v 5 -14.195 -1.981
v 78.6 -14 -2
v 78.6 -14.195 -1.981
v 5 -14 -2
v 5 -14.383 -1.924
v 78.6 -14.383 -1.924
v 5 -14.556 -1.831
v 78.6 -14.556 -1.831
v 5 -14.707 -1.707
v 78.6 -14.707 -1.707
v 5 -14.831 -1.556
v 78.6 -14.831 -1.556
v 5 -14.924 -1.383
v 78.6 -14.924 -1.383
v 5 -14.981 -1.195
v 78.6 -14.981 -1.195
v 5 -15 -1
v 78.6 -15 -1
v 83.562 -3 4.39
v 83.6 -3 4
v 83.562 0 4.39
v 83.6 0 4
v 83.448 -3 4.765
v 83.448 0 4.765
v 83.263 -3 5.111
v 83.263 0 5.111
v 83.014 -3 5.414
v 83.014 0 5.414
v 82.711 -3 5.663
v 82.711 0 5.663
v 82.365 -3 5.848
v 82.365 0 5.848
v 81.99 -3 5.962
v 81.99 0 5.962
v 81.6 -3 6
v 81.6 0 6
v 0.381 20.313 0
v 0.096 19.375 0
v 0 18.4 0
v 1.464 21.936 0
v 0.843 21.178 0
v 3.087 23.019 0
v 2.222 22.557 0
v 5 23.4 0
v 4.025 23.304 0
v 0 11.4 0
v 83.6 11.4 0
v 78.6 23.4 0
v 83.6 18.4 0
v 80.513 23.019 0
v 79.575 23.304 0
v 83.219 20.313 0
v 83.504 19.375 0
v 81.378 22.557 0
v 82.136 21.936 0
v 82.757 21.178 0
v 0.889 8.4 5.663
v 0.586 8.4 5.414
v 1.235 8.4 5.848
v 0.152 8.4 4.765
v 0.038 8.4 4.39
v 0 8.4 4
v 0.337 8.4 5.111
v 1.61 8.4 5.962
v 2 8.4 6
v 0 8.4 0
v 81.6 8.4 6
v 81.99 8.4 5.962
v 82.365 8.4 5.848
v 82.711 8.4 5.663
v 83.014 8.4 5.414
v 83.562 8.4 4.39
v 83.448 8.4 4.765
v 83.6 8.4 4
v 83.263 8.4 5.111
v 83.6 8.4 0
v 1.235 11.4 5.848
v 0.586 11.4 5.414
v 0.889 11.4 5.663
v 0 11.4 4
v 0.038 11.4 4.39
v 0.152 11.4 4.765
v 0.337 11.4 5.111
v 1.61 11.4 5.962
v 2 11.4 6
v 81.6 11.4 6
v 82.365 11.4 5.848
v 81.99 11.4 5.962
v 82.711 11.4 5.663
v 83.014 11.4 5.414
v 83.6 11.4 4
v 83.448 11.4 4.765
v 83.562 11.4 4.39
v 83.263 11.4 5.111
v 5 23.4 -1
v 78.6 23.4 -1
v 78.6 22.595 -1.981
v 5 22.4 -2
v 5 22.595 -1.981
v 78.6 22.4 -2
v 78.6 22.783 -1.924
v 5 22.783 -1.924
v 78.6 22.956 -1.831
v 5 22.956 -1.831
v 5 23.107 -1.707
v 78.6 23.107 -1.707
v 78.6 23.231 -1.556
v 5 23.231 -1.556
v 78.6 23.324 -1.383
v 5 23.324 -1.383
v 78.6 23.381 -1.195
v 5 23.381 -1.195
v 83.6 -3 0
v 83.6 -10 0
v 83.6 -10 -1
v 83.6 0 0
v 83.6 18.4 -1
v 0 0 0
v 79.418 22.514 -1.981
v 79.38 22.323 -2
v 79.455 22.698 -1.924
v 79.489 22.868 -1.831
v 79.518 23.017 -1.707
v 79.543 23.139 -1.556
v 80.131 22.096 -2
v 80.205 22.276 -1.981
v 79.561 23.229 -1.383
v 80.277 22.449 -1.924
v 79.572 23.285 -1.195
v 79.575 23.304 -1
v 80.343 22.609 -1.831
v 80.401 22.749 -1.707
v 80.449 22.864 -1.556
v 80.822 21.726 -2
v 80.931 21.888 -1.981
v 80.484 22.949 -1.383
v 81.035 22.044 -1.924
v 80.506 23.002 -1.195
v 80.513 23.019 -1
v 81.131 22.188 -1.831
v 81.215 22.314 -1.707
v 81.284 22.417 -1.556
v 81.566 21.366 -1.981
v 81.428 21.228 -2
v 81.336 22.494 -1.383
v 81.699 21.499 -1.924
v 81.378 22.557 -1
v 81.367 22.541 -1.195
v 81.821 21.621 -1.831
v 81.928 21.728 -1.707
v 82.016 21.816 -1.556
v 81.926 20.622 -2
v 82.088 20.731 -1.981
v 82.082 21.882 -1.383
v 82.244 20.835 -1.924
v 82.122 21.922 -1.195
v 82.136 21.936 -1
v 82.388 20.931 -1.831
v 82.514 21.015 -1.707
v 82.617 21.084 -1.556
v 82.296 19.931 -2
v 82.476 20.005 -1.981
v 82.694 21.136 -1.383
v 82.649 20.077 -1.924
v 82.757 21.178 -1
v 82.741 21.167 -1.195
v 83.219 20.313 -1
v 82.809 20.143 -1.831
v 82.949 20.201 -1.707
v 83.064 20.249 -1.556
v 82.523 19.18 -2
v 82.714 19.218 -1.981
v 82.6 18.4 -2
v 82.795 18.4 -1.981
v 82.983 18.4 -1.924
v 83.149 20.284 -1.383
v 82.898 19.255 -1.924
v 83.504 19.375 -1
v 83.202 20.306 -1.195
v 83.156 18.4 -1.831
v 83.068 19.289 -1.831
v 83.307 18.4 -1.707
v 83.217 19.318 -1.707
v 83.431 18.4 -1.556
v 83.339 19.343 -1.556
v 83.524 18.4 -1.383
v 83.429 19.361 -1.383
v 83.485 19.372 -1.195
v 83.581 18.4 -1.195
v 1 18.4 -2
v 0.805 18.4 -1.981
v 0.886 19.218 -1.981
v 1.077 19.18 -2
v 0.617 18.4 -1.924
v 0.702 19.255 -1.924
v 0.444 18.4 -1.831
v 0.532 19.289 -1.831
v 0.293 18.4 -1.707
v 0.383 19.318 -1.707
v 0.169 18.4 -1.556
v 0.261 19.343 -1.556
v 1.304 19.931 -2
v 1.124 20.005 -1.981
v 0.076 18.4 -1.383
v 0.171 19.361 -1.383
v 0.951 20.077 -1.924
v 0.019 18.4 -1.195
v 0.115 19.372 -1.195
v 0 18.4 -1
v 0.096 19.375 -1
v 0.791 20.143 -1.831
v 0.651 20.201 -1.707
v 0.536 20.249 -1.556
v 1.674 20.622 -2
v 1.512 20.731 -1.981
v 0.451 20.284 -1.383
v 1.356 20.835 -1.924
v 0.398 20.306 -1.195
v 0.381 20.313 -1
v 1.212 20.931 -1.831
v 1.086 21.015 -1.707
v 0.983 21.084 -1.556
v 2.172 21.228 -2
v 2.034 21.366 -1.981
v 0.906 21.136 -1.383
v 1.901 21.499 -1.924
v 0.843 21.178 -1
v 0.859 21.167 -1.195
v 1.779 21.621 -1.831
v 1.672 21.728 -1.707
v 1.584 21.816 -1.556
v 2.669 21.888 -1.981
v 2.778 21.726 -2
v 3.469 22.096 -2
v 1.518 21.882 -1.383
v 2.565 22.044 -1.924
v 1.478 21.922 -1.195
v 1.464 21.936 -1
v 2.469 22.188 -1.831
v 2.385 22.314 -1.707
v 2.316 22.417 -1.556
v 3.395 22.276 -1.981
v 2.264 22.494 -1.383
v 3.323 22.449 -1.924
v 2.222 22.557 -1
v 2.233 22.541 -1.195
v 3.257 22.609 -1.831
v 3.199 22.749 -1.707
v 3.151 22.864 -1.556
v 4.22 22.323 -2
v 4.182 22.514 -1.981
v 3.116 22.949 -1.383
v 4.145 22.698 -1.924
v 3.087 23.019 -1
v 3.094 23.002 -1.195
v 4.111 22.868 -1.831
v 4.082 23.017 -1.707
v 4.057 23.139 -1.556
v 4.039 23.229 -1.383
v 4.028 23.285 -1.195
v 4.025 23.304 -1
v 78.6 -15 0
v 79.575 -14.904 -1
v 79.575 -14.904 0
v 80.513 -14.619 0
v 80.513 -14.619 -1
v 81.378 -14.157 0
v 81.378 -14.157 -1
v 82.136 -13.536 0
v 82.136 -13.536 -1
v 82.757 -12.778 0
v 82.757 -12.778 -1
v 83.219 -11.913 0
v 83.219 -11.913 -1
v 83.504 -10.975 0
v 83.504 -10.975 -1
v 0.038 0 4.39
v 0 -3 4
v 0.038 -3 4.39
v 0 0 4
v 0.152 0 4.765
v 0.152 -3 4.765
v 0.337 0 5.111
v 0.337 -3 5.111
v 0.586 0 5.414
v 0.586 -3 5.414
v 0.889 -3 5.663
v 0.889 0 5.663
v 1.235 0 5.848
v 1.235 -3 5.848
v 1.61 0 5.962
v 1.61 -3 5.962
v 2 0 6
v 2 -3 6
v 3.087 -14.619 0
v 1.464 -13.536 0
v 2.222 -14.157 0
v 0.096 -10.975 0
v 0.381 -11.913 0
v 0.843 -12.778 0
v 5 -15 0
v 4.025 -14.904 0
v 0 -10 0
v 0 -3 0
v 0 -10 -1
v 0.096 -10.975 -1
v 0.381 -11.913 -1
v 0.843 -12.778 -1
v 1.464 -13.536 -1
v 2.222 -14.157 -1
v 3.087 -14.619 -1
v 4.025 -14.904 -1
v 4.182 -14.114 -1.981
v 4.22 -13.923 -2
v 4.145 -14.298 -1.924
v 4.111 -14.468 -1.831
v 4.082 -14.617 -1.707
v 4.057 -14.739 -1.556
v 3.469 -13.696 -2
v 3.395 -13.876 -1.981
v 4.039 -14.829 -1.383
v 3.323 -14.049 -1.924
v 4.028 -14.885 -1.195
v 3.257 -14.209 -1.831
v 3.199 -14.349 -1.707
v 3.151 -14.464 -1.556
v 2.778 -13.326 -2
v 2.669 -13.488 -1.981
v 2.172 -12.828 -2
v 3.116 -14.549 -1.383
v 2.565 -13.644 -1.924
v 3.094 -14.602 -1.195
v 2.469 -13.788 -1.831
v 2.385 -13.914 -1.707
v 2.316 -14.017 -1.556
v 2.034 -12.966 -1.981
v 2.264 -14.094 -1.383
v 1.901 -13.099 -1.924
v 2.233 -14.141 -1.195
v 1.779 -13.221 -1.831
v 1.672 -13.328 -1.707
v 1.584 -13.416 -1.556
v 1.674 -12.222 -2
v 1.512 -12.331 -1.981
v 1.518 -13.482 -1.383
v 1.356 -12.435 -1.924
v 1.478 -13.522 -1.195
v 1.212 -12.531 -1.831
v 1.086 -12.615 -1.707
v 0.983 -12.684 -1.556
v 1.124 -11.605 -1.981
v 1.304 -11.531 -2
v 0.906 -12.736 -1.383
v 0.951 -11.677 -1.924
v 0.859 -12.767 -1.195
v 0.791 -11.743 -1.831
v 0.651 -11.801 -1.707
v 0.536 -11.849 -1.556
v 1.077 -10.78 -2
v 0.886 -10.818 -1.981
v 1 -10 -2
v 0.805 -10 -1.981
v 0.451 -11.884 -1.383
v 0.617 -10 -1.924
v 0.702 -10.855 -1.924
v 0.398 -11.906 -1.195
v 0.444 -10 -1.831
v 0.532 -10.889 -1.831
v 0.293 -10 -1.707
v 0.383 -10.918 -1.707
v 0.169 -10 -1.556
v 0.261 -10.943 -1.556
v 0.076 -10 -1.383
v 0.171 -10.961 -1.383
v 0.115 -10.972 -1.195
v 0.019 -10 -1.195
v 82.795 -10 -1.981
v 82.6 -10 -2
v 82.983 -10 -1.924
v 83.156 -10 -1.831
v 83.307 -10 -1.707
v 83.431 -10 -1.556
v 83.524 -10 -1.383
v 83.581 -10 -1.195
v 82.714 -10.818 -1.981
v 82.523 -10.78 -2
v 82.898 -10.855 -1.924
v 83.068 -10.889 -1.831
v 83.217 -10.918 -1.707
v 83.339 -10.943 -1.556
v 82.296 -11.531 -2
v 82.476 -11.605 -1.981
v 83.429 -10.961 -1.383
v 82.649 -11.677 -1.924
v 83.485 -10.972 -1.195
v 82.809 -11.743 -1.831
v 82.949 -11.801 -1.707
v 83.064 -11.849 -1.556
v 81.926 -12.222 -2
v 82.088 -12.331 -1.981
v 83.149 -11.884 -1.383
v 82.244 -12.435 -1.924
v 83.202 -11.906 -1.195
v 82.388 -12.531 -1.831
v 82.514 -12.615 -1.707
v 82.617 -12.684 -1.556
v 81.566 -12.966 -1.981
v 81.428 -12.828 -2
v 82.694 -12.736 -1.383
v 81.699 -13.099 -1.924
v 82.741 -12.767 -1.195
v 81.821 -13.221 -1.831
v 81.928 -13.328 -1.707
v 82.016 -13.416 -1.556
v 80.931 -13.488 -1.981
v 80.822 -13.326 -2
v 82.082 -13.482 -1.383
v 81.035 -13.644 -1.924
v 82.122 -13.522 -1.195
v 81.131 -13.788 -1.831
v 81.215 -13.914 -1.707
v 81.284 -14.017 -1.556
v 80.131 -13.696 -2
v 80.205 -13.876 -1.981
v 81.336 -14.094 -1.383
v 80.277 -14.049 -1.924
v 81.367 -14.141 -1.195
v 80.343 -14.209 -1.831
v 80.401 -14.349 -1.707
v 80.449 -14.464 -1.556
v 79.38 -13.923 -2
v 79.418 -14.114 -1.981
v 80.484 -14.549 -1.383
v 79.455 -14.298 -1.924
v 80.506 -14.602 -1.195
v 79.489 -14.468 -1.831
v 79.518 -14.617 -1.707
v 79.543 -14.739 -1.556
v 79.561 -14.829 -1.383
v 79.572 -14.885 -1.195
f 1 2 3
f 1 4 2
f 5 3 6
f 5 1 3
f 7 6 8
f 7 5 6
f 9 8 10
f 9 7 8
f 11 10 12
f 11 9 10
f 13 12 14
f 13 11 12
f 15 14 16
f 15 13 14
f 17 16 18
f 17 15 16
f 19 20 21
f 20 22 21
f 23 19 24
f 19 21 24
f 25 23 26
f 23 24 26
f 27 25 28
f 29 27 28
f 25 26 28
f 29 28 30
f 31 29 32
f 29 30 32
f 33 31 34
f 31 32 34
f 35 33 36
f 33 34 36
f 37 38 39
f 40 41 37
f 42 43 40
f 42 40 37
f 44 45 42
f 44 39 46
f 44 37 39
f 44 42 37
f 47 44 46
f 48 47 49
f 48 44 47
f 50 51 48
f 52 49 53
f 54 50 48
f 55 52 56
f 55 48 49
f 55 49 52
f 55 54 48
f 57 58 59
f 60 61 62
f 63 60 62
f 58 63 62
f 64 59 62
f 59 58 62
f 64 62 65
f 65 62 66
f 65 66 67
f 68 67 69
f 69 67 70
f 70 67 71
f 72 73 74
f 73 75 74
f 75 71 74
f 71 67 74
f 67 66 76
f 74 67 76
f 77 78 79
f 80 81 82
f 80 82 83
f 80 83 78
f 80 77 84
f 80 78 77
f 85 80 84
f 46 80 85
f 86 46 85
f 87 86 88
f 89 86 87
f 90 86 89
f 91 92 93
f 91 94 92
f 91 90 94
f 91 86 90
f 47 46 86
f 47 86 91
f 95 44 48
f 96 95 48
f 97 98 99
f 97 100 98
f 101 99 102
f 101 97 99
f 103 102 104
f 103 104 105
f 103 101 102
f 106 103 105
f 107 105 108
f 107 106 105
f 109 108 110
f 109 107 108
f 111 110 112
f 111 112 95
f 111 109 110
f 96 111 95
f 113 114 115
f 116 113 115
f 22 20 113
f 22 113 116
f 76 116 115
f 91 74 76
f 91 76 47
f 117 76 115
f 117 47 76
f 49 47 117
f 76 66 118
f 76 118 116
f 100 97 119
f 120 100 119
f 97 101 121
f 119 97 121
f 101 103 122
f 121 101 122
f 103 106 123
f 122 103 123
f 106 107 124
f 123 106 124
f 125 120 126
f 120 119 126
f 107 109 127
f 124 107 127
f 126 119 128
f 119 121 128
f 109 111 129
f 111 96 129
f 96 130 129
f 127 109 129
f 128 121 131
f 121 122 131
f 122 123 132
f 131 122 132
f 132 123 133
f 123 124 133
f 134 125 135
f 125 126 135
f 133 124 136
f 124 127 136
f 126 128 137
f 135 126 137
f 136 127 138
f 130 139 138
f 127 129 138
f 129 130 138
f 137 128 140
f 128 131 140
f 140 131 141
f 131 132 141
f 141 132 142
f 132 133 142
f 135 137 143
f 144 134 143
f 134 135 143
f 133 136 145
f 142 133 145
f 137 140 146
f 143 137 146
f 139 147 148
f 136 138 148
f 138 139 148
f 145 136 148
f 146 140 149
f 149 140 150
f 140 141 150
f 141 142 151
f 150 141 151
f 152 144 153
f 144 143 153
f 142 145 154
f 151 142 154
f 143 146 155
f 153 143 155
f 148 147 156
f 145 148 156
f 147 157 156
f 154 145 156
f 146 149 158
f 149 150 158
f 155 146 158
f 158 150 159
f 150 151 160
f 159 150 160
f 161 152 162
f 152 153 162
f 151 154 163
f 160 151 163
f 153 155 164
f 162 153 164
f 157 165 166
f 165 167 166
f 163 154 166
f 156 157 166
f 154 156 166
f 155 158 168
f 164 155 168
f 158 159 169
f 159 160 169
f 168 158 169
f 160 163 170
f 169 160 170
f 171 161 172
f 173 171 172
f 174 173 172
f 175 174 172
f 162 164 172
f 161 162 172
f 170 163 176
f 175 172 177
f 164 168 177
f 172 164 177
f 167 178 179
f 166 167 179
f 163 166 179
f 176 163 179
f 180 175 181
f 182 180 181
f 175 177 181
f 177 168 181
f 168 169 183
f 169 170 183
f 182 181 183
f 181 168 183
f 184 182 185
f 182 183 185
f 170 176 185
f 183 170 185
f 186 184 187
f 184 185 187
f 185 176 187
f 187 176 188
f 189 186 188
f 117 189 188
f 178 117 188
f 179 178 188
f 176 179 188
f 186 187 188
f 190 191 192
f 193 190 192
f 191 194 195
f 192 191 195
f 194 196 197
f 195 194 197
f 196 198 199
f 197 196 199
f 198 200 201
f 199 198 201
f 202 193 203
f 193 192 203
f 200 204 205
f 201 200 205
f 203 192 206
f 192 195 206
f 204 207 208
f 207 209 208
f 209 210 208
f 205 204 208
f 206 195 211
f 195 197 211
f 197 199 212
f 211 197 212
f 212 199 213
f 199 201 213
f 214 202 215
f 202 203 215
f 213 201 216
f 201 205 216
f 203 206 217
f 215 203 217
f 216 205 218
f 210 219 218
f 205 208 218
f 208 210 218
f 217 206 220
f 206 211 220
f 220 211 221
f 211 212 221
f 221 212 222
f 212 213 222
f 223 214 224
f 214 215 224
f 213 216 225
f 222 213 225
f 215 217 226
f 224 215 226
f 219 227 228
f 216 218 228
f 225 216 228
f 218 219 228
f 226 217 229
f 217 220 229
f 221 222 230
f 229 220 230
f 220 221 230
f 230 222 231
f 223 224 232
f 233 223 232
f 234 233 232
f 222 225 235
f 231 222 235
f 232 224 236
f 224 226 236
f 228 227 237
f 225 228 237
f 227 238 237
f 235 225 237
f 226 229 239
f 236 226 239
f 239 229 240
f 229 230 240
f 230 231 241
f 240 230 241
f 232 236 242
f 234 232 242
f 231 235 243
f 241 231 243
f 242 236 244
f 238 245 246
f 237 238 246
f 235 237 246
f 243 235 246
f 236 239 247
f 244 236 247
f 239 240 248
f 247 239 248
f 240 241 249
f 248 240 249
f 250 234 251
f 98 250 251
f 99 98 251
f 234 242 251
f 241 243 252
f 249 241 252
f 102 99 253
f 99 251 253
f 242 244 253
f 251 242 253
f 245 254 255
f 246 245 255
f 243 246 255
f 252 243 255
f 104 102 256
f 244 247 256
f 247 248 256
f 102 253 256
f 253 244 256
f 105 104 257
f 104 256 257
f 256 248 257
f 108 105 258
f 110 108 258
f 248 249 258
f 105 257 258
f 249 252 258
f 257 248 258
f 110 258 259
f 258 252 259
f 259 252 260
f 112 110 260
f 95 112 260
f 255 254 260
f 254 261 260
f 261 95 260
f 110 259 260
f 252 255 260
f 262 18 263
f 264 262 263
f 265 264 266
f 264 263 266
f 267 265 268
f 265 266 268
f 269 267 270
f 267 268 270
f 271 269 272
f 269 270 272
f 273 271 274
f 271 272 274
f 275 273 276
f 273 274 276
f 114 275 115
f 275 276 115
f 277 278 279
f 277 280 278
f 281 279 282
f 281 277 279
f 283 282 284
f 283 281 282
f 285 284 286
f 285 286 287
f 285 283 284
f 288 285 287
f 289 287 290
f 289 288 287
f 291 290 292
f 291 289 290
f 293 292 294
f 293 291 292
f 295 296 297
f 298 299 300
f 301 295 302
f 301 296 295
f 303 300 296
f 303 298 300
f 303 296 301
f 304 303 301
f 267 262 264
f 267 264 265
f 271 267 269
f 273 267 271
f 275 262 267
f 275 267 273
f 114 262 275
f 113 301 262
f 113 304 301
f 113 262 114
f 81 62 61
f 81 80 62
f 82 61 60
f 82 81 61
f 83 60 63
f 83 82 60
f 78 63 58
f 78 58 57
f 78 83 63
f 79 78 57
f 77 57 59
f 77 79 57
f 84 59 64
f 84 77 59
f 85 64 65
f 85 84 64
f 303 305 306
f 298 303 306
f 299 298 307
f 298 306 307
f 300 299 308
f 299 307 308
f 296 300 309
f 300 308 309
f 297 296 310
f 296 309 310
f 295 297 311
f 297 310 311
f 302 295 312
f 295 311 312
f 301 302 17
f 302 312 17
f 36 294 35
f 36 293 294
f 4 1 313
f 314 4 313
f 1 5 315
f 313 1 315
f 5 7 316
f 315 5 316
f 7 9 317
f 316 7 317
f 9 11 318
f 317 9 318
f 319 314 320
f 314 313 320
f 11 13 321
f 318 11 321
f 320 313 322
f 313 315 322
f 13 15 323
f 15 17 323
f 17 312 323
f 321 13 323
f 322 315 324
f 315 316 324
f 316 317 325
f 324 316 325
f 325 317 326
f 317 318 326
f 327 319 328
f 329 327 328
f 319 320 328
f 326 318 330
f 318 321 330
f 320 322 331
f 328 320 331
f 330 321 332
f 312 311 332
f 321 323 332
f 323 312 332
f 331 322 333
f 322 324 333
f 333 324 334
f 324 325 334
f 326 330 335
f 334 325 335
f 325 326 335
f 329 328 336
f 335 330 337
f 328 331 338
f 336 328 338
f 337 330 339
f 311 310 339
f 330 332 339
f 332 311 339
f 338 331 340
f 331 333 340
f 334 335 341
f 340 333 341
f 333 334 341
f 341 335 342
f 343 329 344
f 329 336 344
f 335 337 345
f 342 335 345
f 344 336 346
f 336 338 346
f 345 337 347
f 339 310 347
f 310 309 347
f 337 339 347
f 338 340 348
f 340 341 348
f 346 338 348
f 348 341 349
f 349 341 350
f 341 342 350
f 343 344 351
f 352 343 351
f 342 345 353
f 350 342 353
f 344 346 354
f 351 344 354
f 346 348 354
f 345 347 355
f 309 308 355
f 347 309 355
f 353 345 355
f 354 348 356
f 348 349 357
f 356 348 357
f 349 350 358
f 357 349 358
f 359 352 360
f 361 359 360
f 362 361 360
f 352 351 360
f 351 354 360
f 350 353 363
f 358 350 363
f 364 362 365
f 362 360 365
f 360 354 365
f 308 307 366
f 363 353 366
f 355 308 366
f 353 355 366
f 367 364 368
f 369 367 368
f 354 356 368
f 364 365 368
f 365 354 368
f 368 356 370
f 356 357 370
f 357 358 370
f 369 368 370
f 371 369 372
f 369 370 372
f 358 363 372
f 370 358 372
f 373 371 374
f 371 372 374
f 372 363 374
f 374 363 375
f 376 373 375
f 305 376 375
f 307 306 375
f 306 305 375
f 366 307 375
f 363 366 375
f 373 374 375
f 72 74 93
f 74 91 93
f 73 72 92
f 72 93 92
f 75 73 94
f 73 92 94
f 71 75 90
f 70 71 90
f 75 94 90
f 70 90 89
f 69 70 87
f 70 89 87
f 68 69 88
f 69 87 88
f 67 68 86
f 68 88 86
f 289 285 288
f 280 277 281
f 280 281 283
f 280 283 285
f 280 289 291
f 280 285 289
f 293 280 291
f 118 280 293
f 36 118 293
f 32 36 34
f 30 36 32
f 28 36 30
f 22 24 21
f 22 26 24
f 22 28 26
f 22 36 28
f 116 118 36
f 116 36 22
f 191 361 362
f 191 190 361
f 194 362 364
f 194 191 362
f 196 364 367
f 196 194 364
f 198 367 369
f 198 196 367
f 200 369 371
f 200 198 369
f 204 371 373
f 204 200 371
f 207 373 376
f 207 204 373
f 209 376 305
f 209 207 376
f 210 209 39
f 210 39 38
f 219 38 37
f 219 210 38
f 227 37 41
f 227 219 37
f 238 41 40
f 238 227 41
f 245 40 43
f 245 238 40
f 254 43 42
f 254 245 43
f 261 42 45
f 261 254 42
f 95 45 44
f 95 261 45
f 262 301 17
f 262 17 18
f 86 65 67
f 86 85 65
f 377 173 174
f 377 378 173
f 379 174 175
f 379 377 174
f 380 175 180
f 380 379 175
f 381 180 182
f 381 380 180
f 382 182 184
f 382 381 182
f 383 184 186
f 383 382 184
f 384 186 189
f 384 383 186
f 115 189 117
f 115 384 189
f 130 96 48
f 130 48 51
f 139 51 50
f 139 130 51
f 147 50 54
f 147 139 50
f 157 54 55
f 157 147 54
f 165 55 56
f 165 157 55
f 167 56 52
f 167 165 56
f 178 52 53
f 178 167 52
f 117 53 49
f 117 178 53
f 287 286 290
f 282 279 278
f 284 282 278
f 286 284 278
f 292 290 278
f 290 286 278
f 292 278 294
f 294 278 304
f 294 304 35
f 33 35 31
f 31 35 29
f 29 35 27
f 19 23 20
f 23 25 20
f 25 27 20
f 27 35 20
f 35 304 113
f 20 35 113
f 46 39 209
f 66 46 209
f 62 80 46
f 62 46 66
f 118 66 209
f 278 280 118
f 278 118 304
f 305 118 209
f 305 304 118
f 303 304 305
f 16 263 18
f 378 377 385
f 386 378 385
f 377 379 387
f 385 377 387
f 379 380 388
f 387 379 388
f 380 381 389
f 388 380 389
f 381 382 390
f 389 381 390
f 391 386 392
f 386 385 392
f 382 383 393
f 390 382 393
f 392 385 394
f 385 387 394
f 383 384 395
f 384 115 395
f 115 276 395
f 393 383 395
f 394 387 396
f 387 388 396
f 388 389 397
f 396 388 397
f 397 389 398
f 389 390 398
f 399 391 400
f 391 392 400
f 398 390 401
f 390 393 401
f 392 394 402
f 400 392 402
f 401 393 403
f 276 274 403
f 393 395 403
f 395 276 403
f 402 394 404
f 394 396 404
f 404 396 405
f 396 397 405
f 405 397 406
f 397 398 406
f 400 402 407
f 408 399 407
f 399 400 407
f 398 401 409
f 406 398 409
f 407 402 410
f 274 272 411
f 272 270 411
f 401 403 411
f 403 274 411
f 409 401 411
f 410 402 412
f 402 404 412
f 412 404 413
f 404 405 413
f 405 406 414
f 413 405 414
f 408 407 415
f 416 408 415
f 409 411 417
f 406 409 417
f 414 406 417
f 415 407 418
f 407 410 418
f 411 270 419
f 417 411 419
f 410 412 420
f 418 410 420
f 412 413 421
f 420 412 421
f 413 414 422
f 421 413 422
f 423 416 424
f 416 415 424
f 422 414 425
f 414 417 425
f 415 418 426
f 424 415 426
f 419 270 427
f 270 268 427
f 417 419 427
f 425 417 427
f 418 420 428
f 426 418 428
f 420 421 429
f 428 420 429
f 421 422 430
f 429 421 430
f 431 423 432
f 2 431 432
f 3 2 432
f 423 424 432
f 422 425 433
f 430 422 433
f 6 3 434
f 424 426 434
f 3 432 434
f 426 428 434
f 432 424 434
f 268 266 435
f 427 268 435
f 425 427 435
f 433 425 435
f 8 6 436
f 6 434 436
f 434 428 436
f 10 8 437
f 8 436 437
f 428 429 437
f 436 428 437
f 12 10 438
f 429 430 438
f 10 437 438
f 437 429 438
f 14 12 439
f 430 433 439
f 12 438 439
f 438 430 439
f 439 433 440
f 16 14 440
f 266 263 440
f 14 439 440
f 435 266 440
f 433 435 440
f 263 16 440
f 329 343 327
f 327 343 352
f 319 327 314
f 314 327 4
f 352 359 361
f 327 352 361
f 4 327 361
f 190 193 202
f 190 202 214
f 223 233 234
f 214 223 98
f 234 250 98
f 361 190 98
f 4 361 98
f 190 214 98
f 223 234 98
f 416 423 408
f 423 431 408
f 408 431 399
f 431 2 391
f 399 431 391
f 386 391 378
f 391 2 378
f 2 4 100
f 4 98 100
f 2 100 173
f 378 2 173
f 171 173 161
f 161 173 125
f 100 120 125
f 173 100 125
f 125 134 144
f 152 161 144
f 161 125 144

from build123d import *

# Parameters (mm, degrees)
F0_W     = 83.6
F0_H     = 3
F0_H_2   = 8.4
F0_H_3   = 12
F1_DEPTH = 2
F2_DEPTH = 6
F3_R     = 2
F4_R     = 5
F5_R     = 1


with BuildPart() as f1:
    # F0 (on Top) → F1 (new body)
    with BuildSketch(Plane.XY):
        with Locations((41.8, 9.9)):
            Rectangle(F0_W, F0_H)
        with Locations((41.8, -1.5)):
            Rectangle(F0_W, F0_H)
        with Locations((41.8, 4.2)):
            Rectangle(F0_W, F0_H_2)
        with Locations((41.8, 17.4)):
            Rectangle(F0_W, F0_H_3)
        with Locations((41.8, -9)):
            Rectangle(F0_W, F0_H_3)
    extrude(amount=-F1_DEPTH)

    # F0 (on Top) → F2 (join)
    with BuildSketch(Plane.XY):
        with Locations((41.8, 9.9)):
            Rectangle(F0_W, F0_H)
        with Locations((41.8, -1.5)):
            Rectangle(F0_W, F0_H)
    extrude(amount=F2_DEPTH)

    # F3
    f3_edges = [f1.edges().sort_by_distance(p)[0] for p in [
        (0, 9.9, 6),
        (0, -1.5, 6),
        (83.6, 9.9, 6),
        (83.6, -1.5, 6),
    ]]
    fillet(f3_edges, radius=F3_R)

    # F4
    f4_edges = [f1.edges().sort_by_distance(p)[0] for p in [
        (83.6, -15, -1),
        (83.6, 23.4, -1),
        (0, 23.4, -1),
        (0, -15, -1),
    ]]
    fillet(f4_edges, radius=F4_R)

    # F5
    f5_edges = [f1.edges().sort_by_distance(p)[0] for p in [
        (41.8, 23.4, -2),
    ]]
    fillet(f5_edges, radius=F5_R)


solid = f1.part
